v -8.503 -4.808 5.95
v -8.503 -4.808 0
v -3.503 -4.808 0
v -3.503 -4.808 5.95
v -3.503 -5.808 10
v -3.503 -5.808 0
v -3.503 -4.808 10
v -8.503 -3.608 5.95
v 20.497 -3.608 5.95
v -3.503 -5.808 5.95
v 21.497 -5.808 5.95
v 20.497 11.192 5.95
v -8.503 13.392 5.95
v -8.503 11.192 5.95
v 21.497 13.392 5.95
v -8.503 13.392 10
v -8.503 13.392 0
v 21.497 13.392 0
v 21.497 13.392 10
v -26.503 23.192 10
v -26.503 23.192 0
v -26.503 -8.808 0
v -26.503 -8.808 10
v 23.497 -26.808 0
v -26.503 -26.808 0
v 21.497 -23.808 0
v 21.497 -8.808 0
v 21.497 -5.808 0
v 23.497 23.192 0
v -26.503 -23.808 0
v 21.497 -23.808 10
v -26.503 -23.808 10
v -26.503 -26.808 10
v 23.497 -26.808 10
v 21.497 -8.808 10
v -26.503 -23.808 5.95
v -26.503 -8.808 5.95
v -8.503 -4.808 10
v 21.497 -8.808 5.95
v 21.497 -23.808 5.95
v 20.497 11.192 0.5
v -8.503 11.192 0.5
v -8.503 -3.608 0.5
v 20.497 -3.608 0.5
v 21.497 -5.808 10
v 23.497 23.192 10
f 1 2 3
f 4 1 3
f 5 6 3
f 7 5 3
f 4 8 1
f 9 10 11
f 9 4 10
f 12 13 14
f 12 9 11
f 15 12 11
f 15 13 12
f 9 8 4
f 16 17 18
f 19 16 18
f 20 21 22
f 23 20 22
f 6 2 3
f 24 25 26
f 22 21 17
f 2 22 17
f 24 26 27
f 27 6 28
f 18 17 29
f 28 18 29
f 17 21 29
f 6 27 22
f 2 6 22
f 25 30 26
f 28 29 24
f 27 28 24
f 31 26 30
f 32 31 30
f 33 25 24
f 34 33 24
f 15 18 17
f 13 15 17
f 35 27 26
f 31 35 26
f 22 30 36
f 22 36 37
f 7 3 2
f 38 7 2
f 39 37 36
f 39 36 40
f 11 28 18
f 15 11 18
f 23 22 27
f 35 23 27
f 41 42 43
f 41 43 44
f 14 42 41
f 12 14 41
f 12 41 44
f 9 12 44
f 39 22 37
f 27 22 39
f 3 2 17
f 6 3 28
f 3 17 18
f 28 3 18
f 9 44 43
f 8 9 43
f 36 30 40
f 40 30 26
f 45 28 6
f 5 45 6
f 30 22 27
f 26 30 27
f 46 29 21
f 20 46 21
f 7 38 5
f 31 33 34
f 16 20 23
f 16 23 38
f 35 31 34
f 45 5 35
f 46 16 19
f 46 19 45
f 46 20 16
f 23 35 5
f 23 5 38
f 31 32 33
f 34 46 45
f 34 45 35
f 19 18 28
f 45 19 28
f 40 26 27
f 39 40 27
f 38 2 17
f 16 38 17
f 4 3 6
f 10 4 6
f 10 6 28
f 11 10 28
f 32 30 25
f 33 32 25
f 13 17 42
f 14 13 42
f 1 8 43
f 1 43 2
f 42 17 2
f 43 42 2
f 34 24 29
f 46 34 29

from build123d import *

# Parameters (mm, degrees)
F0_W     = 29
F0_H     = 14.8
F1_DEPTH = 0.5
F2_DEPTH = 5.95
F0_W_2   = 48
F0_H_2   = 15
F3_DEPTH = 5.95
F4_DEPTH = 10


with BuildPart() as f1:
    # F0 (on Top) → F1 (new body)
    with BuildSketch(Plane.XY):
        with Locations((5.996847, 3.792403)):
            Rectangle(F0_W, F0_H)
    extrude(amount=F1_DEPTH)

    # F0 (on Top) → F2 (join)
    with BuildSketch(Plane.XY):
        Polygon((-3.503153, -5.807597), (21.496847, -5.807597), (21.496847, 13.392403), (-3.503153, 13.392403), (-8.503153, 13.392403), (-8.503153, 11.192403), (20.496847, 11.192403), (20.496847, -3.607597), (-8.503153, -3.607597), (-8.503153, -4.807597), (-3.503153, -4.807597), align=None)
    extrude(amount=F2_DEPTH)


with BuildPart() as f3:
    # F0 (on Top) → F3 (new body)
    with BuildSketch(Plane.XY):
        with Locations((-2.503153, -16.307597)):
            Rectangle(F0_W_2, F0_H_2)
    extrude(amount=F3_DEPTH)


with BuildPart() as f4:
    # F0 (on Top) → F4 (new body)
    with BuildSketch(Plane.XY):
        Polygon((23.496847, 23.192403), (-26.503153, 23.192403), (-26.503153, -8.807597), (21.496847, -8.807597), (21.496847, -23.807597), (23.496847, -23.807597), align=None)
        Polygon((21.496847, 13.392403), (21.496847, -5.807597), (-3.503153, -5.807597), (-3.503153, -4.807597), (-8.503153, -4.807597), (-8.503153, -3.607597), (-8.503153, 11.192403), (-8.503153, 13.392403), (-3.503153, 13.392403), align=None, mode=Mode.SUBTRACT)
        Polygon((23.496847, -26.807597), (23.496847, -23.807597), (21.496847, -23.807597), (-26.503153, -23.807597), (-26.503153, -26.807597), align=None)
    extrude(amount=F4_DEPTH)


solid = Compound([f1.part, f3.part, f4.part])
